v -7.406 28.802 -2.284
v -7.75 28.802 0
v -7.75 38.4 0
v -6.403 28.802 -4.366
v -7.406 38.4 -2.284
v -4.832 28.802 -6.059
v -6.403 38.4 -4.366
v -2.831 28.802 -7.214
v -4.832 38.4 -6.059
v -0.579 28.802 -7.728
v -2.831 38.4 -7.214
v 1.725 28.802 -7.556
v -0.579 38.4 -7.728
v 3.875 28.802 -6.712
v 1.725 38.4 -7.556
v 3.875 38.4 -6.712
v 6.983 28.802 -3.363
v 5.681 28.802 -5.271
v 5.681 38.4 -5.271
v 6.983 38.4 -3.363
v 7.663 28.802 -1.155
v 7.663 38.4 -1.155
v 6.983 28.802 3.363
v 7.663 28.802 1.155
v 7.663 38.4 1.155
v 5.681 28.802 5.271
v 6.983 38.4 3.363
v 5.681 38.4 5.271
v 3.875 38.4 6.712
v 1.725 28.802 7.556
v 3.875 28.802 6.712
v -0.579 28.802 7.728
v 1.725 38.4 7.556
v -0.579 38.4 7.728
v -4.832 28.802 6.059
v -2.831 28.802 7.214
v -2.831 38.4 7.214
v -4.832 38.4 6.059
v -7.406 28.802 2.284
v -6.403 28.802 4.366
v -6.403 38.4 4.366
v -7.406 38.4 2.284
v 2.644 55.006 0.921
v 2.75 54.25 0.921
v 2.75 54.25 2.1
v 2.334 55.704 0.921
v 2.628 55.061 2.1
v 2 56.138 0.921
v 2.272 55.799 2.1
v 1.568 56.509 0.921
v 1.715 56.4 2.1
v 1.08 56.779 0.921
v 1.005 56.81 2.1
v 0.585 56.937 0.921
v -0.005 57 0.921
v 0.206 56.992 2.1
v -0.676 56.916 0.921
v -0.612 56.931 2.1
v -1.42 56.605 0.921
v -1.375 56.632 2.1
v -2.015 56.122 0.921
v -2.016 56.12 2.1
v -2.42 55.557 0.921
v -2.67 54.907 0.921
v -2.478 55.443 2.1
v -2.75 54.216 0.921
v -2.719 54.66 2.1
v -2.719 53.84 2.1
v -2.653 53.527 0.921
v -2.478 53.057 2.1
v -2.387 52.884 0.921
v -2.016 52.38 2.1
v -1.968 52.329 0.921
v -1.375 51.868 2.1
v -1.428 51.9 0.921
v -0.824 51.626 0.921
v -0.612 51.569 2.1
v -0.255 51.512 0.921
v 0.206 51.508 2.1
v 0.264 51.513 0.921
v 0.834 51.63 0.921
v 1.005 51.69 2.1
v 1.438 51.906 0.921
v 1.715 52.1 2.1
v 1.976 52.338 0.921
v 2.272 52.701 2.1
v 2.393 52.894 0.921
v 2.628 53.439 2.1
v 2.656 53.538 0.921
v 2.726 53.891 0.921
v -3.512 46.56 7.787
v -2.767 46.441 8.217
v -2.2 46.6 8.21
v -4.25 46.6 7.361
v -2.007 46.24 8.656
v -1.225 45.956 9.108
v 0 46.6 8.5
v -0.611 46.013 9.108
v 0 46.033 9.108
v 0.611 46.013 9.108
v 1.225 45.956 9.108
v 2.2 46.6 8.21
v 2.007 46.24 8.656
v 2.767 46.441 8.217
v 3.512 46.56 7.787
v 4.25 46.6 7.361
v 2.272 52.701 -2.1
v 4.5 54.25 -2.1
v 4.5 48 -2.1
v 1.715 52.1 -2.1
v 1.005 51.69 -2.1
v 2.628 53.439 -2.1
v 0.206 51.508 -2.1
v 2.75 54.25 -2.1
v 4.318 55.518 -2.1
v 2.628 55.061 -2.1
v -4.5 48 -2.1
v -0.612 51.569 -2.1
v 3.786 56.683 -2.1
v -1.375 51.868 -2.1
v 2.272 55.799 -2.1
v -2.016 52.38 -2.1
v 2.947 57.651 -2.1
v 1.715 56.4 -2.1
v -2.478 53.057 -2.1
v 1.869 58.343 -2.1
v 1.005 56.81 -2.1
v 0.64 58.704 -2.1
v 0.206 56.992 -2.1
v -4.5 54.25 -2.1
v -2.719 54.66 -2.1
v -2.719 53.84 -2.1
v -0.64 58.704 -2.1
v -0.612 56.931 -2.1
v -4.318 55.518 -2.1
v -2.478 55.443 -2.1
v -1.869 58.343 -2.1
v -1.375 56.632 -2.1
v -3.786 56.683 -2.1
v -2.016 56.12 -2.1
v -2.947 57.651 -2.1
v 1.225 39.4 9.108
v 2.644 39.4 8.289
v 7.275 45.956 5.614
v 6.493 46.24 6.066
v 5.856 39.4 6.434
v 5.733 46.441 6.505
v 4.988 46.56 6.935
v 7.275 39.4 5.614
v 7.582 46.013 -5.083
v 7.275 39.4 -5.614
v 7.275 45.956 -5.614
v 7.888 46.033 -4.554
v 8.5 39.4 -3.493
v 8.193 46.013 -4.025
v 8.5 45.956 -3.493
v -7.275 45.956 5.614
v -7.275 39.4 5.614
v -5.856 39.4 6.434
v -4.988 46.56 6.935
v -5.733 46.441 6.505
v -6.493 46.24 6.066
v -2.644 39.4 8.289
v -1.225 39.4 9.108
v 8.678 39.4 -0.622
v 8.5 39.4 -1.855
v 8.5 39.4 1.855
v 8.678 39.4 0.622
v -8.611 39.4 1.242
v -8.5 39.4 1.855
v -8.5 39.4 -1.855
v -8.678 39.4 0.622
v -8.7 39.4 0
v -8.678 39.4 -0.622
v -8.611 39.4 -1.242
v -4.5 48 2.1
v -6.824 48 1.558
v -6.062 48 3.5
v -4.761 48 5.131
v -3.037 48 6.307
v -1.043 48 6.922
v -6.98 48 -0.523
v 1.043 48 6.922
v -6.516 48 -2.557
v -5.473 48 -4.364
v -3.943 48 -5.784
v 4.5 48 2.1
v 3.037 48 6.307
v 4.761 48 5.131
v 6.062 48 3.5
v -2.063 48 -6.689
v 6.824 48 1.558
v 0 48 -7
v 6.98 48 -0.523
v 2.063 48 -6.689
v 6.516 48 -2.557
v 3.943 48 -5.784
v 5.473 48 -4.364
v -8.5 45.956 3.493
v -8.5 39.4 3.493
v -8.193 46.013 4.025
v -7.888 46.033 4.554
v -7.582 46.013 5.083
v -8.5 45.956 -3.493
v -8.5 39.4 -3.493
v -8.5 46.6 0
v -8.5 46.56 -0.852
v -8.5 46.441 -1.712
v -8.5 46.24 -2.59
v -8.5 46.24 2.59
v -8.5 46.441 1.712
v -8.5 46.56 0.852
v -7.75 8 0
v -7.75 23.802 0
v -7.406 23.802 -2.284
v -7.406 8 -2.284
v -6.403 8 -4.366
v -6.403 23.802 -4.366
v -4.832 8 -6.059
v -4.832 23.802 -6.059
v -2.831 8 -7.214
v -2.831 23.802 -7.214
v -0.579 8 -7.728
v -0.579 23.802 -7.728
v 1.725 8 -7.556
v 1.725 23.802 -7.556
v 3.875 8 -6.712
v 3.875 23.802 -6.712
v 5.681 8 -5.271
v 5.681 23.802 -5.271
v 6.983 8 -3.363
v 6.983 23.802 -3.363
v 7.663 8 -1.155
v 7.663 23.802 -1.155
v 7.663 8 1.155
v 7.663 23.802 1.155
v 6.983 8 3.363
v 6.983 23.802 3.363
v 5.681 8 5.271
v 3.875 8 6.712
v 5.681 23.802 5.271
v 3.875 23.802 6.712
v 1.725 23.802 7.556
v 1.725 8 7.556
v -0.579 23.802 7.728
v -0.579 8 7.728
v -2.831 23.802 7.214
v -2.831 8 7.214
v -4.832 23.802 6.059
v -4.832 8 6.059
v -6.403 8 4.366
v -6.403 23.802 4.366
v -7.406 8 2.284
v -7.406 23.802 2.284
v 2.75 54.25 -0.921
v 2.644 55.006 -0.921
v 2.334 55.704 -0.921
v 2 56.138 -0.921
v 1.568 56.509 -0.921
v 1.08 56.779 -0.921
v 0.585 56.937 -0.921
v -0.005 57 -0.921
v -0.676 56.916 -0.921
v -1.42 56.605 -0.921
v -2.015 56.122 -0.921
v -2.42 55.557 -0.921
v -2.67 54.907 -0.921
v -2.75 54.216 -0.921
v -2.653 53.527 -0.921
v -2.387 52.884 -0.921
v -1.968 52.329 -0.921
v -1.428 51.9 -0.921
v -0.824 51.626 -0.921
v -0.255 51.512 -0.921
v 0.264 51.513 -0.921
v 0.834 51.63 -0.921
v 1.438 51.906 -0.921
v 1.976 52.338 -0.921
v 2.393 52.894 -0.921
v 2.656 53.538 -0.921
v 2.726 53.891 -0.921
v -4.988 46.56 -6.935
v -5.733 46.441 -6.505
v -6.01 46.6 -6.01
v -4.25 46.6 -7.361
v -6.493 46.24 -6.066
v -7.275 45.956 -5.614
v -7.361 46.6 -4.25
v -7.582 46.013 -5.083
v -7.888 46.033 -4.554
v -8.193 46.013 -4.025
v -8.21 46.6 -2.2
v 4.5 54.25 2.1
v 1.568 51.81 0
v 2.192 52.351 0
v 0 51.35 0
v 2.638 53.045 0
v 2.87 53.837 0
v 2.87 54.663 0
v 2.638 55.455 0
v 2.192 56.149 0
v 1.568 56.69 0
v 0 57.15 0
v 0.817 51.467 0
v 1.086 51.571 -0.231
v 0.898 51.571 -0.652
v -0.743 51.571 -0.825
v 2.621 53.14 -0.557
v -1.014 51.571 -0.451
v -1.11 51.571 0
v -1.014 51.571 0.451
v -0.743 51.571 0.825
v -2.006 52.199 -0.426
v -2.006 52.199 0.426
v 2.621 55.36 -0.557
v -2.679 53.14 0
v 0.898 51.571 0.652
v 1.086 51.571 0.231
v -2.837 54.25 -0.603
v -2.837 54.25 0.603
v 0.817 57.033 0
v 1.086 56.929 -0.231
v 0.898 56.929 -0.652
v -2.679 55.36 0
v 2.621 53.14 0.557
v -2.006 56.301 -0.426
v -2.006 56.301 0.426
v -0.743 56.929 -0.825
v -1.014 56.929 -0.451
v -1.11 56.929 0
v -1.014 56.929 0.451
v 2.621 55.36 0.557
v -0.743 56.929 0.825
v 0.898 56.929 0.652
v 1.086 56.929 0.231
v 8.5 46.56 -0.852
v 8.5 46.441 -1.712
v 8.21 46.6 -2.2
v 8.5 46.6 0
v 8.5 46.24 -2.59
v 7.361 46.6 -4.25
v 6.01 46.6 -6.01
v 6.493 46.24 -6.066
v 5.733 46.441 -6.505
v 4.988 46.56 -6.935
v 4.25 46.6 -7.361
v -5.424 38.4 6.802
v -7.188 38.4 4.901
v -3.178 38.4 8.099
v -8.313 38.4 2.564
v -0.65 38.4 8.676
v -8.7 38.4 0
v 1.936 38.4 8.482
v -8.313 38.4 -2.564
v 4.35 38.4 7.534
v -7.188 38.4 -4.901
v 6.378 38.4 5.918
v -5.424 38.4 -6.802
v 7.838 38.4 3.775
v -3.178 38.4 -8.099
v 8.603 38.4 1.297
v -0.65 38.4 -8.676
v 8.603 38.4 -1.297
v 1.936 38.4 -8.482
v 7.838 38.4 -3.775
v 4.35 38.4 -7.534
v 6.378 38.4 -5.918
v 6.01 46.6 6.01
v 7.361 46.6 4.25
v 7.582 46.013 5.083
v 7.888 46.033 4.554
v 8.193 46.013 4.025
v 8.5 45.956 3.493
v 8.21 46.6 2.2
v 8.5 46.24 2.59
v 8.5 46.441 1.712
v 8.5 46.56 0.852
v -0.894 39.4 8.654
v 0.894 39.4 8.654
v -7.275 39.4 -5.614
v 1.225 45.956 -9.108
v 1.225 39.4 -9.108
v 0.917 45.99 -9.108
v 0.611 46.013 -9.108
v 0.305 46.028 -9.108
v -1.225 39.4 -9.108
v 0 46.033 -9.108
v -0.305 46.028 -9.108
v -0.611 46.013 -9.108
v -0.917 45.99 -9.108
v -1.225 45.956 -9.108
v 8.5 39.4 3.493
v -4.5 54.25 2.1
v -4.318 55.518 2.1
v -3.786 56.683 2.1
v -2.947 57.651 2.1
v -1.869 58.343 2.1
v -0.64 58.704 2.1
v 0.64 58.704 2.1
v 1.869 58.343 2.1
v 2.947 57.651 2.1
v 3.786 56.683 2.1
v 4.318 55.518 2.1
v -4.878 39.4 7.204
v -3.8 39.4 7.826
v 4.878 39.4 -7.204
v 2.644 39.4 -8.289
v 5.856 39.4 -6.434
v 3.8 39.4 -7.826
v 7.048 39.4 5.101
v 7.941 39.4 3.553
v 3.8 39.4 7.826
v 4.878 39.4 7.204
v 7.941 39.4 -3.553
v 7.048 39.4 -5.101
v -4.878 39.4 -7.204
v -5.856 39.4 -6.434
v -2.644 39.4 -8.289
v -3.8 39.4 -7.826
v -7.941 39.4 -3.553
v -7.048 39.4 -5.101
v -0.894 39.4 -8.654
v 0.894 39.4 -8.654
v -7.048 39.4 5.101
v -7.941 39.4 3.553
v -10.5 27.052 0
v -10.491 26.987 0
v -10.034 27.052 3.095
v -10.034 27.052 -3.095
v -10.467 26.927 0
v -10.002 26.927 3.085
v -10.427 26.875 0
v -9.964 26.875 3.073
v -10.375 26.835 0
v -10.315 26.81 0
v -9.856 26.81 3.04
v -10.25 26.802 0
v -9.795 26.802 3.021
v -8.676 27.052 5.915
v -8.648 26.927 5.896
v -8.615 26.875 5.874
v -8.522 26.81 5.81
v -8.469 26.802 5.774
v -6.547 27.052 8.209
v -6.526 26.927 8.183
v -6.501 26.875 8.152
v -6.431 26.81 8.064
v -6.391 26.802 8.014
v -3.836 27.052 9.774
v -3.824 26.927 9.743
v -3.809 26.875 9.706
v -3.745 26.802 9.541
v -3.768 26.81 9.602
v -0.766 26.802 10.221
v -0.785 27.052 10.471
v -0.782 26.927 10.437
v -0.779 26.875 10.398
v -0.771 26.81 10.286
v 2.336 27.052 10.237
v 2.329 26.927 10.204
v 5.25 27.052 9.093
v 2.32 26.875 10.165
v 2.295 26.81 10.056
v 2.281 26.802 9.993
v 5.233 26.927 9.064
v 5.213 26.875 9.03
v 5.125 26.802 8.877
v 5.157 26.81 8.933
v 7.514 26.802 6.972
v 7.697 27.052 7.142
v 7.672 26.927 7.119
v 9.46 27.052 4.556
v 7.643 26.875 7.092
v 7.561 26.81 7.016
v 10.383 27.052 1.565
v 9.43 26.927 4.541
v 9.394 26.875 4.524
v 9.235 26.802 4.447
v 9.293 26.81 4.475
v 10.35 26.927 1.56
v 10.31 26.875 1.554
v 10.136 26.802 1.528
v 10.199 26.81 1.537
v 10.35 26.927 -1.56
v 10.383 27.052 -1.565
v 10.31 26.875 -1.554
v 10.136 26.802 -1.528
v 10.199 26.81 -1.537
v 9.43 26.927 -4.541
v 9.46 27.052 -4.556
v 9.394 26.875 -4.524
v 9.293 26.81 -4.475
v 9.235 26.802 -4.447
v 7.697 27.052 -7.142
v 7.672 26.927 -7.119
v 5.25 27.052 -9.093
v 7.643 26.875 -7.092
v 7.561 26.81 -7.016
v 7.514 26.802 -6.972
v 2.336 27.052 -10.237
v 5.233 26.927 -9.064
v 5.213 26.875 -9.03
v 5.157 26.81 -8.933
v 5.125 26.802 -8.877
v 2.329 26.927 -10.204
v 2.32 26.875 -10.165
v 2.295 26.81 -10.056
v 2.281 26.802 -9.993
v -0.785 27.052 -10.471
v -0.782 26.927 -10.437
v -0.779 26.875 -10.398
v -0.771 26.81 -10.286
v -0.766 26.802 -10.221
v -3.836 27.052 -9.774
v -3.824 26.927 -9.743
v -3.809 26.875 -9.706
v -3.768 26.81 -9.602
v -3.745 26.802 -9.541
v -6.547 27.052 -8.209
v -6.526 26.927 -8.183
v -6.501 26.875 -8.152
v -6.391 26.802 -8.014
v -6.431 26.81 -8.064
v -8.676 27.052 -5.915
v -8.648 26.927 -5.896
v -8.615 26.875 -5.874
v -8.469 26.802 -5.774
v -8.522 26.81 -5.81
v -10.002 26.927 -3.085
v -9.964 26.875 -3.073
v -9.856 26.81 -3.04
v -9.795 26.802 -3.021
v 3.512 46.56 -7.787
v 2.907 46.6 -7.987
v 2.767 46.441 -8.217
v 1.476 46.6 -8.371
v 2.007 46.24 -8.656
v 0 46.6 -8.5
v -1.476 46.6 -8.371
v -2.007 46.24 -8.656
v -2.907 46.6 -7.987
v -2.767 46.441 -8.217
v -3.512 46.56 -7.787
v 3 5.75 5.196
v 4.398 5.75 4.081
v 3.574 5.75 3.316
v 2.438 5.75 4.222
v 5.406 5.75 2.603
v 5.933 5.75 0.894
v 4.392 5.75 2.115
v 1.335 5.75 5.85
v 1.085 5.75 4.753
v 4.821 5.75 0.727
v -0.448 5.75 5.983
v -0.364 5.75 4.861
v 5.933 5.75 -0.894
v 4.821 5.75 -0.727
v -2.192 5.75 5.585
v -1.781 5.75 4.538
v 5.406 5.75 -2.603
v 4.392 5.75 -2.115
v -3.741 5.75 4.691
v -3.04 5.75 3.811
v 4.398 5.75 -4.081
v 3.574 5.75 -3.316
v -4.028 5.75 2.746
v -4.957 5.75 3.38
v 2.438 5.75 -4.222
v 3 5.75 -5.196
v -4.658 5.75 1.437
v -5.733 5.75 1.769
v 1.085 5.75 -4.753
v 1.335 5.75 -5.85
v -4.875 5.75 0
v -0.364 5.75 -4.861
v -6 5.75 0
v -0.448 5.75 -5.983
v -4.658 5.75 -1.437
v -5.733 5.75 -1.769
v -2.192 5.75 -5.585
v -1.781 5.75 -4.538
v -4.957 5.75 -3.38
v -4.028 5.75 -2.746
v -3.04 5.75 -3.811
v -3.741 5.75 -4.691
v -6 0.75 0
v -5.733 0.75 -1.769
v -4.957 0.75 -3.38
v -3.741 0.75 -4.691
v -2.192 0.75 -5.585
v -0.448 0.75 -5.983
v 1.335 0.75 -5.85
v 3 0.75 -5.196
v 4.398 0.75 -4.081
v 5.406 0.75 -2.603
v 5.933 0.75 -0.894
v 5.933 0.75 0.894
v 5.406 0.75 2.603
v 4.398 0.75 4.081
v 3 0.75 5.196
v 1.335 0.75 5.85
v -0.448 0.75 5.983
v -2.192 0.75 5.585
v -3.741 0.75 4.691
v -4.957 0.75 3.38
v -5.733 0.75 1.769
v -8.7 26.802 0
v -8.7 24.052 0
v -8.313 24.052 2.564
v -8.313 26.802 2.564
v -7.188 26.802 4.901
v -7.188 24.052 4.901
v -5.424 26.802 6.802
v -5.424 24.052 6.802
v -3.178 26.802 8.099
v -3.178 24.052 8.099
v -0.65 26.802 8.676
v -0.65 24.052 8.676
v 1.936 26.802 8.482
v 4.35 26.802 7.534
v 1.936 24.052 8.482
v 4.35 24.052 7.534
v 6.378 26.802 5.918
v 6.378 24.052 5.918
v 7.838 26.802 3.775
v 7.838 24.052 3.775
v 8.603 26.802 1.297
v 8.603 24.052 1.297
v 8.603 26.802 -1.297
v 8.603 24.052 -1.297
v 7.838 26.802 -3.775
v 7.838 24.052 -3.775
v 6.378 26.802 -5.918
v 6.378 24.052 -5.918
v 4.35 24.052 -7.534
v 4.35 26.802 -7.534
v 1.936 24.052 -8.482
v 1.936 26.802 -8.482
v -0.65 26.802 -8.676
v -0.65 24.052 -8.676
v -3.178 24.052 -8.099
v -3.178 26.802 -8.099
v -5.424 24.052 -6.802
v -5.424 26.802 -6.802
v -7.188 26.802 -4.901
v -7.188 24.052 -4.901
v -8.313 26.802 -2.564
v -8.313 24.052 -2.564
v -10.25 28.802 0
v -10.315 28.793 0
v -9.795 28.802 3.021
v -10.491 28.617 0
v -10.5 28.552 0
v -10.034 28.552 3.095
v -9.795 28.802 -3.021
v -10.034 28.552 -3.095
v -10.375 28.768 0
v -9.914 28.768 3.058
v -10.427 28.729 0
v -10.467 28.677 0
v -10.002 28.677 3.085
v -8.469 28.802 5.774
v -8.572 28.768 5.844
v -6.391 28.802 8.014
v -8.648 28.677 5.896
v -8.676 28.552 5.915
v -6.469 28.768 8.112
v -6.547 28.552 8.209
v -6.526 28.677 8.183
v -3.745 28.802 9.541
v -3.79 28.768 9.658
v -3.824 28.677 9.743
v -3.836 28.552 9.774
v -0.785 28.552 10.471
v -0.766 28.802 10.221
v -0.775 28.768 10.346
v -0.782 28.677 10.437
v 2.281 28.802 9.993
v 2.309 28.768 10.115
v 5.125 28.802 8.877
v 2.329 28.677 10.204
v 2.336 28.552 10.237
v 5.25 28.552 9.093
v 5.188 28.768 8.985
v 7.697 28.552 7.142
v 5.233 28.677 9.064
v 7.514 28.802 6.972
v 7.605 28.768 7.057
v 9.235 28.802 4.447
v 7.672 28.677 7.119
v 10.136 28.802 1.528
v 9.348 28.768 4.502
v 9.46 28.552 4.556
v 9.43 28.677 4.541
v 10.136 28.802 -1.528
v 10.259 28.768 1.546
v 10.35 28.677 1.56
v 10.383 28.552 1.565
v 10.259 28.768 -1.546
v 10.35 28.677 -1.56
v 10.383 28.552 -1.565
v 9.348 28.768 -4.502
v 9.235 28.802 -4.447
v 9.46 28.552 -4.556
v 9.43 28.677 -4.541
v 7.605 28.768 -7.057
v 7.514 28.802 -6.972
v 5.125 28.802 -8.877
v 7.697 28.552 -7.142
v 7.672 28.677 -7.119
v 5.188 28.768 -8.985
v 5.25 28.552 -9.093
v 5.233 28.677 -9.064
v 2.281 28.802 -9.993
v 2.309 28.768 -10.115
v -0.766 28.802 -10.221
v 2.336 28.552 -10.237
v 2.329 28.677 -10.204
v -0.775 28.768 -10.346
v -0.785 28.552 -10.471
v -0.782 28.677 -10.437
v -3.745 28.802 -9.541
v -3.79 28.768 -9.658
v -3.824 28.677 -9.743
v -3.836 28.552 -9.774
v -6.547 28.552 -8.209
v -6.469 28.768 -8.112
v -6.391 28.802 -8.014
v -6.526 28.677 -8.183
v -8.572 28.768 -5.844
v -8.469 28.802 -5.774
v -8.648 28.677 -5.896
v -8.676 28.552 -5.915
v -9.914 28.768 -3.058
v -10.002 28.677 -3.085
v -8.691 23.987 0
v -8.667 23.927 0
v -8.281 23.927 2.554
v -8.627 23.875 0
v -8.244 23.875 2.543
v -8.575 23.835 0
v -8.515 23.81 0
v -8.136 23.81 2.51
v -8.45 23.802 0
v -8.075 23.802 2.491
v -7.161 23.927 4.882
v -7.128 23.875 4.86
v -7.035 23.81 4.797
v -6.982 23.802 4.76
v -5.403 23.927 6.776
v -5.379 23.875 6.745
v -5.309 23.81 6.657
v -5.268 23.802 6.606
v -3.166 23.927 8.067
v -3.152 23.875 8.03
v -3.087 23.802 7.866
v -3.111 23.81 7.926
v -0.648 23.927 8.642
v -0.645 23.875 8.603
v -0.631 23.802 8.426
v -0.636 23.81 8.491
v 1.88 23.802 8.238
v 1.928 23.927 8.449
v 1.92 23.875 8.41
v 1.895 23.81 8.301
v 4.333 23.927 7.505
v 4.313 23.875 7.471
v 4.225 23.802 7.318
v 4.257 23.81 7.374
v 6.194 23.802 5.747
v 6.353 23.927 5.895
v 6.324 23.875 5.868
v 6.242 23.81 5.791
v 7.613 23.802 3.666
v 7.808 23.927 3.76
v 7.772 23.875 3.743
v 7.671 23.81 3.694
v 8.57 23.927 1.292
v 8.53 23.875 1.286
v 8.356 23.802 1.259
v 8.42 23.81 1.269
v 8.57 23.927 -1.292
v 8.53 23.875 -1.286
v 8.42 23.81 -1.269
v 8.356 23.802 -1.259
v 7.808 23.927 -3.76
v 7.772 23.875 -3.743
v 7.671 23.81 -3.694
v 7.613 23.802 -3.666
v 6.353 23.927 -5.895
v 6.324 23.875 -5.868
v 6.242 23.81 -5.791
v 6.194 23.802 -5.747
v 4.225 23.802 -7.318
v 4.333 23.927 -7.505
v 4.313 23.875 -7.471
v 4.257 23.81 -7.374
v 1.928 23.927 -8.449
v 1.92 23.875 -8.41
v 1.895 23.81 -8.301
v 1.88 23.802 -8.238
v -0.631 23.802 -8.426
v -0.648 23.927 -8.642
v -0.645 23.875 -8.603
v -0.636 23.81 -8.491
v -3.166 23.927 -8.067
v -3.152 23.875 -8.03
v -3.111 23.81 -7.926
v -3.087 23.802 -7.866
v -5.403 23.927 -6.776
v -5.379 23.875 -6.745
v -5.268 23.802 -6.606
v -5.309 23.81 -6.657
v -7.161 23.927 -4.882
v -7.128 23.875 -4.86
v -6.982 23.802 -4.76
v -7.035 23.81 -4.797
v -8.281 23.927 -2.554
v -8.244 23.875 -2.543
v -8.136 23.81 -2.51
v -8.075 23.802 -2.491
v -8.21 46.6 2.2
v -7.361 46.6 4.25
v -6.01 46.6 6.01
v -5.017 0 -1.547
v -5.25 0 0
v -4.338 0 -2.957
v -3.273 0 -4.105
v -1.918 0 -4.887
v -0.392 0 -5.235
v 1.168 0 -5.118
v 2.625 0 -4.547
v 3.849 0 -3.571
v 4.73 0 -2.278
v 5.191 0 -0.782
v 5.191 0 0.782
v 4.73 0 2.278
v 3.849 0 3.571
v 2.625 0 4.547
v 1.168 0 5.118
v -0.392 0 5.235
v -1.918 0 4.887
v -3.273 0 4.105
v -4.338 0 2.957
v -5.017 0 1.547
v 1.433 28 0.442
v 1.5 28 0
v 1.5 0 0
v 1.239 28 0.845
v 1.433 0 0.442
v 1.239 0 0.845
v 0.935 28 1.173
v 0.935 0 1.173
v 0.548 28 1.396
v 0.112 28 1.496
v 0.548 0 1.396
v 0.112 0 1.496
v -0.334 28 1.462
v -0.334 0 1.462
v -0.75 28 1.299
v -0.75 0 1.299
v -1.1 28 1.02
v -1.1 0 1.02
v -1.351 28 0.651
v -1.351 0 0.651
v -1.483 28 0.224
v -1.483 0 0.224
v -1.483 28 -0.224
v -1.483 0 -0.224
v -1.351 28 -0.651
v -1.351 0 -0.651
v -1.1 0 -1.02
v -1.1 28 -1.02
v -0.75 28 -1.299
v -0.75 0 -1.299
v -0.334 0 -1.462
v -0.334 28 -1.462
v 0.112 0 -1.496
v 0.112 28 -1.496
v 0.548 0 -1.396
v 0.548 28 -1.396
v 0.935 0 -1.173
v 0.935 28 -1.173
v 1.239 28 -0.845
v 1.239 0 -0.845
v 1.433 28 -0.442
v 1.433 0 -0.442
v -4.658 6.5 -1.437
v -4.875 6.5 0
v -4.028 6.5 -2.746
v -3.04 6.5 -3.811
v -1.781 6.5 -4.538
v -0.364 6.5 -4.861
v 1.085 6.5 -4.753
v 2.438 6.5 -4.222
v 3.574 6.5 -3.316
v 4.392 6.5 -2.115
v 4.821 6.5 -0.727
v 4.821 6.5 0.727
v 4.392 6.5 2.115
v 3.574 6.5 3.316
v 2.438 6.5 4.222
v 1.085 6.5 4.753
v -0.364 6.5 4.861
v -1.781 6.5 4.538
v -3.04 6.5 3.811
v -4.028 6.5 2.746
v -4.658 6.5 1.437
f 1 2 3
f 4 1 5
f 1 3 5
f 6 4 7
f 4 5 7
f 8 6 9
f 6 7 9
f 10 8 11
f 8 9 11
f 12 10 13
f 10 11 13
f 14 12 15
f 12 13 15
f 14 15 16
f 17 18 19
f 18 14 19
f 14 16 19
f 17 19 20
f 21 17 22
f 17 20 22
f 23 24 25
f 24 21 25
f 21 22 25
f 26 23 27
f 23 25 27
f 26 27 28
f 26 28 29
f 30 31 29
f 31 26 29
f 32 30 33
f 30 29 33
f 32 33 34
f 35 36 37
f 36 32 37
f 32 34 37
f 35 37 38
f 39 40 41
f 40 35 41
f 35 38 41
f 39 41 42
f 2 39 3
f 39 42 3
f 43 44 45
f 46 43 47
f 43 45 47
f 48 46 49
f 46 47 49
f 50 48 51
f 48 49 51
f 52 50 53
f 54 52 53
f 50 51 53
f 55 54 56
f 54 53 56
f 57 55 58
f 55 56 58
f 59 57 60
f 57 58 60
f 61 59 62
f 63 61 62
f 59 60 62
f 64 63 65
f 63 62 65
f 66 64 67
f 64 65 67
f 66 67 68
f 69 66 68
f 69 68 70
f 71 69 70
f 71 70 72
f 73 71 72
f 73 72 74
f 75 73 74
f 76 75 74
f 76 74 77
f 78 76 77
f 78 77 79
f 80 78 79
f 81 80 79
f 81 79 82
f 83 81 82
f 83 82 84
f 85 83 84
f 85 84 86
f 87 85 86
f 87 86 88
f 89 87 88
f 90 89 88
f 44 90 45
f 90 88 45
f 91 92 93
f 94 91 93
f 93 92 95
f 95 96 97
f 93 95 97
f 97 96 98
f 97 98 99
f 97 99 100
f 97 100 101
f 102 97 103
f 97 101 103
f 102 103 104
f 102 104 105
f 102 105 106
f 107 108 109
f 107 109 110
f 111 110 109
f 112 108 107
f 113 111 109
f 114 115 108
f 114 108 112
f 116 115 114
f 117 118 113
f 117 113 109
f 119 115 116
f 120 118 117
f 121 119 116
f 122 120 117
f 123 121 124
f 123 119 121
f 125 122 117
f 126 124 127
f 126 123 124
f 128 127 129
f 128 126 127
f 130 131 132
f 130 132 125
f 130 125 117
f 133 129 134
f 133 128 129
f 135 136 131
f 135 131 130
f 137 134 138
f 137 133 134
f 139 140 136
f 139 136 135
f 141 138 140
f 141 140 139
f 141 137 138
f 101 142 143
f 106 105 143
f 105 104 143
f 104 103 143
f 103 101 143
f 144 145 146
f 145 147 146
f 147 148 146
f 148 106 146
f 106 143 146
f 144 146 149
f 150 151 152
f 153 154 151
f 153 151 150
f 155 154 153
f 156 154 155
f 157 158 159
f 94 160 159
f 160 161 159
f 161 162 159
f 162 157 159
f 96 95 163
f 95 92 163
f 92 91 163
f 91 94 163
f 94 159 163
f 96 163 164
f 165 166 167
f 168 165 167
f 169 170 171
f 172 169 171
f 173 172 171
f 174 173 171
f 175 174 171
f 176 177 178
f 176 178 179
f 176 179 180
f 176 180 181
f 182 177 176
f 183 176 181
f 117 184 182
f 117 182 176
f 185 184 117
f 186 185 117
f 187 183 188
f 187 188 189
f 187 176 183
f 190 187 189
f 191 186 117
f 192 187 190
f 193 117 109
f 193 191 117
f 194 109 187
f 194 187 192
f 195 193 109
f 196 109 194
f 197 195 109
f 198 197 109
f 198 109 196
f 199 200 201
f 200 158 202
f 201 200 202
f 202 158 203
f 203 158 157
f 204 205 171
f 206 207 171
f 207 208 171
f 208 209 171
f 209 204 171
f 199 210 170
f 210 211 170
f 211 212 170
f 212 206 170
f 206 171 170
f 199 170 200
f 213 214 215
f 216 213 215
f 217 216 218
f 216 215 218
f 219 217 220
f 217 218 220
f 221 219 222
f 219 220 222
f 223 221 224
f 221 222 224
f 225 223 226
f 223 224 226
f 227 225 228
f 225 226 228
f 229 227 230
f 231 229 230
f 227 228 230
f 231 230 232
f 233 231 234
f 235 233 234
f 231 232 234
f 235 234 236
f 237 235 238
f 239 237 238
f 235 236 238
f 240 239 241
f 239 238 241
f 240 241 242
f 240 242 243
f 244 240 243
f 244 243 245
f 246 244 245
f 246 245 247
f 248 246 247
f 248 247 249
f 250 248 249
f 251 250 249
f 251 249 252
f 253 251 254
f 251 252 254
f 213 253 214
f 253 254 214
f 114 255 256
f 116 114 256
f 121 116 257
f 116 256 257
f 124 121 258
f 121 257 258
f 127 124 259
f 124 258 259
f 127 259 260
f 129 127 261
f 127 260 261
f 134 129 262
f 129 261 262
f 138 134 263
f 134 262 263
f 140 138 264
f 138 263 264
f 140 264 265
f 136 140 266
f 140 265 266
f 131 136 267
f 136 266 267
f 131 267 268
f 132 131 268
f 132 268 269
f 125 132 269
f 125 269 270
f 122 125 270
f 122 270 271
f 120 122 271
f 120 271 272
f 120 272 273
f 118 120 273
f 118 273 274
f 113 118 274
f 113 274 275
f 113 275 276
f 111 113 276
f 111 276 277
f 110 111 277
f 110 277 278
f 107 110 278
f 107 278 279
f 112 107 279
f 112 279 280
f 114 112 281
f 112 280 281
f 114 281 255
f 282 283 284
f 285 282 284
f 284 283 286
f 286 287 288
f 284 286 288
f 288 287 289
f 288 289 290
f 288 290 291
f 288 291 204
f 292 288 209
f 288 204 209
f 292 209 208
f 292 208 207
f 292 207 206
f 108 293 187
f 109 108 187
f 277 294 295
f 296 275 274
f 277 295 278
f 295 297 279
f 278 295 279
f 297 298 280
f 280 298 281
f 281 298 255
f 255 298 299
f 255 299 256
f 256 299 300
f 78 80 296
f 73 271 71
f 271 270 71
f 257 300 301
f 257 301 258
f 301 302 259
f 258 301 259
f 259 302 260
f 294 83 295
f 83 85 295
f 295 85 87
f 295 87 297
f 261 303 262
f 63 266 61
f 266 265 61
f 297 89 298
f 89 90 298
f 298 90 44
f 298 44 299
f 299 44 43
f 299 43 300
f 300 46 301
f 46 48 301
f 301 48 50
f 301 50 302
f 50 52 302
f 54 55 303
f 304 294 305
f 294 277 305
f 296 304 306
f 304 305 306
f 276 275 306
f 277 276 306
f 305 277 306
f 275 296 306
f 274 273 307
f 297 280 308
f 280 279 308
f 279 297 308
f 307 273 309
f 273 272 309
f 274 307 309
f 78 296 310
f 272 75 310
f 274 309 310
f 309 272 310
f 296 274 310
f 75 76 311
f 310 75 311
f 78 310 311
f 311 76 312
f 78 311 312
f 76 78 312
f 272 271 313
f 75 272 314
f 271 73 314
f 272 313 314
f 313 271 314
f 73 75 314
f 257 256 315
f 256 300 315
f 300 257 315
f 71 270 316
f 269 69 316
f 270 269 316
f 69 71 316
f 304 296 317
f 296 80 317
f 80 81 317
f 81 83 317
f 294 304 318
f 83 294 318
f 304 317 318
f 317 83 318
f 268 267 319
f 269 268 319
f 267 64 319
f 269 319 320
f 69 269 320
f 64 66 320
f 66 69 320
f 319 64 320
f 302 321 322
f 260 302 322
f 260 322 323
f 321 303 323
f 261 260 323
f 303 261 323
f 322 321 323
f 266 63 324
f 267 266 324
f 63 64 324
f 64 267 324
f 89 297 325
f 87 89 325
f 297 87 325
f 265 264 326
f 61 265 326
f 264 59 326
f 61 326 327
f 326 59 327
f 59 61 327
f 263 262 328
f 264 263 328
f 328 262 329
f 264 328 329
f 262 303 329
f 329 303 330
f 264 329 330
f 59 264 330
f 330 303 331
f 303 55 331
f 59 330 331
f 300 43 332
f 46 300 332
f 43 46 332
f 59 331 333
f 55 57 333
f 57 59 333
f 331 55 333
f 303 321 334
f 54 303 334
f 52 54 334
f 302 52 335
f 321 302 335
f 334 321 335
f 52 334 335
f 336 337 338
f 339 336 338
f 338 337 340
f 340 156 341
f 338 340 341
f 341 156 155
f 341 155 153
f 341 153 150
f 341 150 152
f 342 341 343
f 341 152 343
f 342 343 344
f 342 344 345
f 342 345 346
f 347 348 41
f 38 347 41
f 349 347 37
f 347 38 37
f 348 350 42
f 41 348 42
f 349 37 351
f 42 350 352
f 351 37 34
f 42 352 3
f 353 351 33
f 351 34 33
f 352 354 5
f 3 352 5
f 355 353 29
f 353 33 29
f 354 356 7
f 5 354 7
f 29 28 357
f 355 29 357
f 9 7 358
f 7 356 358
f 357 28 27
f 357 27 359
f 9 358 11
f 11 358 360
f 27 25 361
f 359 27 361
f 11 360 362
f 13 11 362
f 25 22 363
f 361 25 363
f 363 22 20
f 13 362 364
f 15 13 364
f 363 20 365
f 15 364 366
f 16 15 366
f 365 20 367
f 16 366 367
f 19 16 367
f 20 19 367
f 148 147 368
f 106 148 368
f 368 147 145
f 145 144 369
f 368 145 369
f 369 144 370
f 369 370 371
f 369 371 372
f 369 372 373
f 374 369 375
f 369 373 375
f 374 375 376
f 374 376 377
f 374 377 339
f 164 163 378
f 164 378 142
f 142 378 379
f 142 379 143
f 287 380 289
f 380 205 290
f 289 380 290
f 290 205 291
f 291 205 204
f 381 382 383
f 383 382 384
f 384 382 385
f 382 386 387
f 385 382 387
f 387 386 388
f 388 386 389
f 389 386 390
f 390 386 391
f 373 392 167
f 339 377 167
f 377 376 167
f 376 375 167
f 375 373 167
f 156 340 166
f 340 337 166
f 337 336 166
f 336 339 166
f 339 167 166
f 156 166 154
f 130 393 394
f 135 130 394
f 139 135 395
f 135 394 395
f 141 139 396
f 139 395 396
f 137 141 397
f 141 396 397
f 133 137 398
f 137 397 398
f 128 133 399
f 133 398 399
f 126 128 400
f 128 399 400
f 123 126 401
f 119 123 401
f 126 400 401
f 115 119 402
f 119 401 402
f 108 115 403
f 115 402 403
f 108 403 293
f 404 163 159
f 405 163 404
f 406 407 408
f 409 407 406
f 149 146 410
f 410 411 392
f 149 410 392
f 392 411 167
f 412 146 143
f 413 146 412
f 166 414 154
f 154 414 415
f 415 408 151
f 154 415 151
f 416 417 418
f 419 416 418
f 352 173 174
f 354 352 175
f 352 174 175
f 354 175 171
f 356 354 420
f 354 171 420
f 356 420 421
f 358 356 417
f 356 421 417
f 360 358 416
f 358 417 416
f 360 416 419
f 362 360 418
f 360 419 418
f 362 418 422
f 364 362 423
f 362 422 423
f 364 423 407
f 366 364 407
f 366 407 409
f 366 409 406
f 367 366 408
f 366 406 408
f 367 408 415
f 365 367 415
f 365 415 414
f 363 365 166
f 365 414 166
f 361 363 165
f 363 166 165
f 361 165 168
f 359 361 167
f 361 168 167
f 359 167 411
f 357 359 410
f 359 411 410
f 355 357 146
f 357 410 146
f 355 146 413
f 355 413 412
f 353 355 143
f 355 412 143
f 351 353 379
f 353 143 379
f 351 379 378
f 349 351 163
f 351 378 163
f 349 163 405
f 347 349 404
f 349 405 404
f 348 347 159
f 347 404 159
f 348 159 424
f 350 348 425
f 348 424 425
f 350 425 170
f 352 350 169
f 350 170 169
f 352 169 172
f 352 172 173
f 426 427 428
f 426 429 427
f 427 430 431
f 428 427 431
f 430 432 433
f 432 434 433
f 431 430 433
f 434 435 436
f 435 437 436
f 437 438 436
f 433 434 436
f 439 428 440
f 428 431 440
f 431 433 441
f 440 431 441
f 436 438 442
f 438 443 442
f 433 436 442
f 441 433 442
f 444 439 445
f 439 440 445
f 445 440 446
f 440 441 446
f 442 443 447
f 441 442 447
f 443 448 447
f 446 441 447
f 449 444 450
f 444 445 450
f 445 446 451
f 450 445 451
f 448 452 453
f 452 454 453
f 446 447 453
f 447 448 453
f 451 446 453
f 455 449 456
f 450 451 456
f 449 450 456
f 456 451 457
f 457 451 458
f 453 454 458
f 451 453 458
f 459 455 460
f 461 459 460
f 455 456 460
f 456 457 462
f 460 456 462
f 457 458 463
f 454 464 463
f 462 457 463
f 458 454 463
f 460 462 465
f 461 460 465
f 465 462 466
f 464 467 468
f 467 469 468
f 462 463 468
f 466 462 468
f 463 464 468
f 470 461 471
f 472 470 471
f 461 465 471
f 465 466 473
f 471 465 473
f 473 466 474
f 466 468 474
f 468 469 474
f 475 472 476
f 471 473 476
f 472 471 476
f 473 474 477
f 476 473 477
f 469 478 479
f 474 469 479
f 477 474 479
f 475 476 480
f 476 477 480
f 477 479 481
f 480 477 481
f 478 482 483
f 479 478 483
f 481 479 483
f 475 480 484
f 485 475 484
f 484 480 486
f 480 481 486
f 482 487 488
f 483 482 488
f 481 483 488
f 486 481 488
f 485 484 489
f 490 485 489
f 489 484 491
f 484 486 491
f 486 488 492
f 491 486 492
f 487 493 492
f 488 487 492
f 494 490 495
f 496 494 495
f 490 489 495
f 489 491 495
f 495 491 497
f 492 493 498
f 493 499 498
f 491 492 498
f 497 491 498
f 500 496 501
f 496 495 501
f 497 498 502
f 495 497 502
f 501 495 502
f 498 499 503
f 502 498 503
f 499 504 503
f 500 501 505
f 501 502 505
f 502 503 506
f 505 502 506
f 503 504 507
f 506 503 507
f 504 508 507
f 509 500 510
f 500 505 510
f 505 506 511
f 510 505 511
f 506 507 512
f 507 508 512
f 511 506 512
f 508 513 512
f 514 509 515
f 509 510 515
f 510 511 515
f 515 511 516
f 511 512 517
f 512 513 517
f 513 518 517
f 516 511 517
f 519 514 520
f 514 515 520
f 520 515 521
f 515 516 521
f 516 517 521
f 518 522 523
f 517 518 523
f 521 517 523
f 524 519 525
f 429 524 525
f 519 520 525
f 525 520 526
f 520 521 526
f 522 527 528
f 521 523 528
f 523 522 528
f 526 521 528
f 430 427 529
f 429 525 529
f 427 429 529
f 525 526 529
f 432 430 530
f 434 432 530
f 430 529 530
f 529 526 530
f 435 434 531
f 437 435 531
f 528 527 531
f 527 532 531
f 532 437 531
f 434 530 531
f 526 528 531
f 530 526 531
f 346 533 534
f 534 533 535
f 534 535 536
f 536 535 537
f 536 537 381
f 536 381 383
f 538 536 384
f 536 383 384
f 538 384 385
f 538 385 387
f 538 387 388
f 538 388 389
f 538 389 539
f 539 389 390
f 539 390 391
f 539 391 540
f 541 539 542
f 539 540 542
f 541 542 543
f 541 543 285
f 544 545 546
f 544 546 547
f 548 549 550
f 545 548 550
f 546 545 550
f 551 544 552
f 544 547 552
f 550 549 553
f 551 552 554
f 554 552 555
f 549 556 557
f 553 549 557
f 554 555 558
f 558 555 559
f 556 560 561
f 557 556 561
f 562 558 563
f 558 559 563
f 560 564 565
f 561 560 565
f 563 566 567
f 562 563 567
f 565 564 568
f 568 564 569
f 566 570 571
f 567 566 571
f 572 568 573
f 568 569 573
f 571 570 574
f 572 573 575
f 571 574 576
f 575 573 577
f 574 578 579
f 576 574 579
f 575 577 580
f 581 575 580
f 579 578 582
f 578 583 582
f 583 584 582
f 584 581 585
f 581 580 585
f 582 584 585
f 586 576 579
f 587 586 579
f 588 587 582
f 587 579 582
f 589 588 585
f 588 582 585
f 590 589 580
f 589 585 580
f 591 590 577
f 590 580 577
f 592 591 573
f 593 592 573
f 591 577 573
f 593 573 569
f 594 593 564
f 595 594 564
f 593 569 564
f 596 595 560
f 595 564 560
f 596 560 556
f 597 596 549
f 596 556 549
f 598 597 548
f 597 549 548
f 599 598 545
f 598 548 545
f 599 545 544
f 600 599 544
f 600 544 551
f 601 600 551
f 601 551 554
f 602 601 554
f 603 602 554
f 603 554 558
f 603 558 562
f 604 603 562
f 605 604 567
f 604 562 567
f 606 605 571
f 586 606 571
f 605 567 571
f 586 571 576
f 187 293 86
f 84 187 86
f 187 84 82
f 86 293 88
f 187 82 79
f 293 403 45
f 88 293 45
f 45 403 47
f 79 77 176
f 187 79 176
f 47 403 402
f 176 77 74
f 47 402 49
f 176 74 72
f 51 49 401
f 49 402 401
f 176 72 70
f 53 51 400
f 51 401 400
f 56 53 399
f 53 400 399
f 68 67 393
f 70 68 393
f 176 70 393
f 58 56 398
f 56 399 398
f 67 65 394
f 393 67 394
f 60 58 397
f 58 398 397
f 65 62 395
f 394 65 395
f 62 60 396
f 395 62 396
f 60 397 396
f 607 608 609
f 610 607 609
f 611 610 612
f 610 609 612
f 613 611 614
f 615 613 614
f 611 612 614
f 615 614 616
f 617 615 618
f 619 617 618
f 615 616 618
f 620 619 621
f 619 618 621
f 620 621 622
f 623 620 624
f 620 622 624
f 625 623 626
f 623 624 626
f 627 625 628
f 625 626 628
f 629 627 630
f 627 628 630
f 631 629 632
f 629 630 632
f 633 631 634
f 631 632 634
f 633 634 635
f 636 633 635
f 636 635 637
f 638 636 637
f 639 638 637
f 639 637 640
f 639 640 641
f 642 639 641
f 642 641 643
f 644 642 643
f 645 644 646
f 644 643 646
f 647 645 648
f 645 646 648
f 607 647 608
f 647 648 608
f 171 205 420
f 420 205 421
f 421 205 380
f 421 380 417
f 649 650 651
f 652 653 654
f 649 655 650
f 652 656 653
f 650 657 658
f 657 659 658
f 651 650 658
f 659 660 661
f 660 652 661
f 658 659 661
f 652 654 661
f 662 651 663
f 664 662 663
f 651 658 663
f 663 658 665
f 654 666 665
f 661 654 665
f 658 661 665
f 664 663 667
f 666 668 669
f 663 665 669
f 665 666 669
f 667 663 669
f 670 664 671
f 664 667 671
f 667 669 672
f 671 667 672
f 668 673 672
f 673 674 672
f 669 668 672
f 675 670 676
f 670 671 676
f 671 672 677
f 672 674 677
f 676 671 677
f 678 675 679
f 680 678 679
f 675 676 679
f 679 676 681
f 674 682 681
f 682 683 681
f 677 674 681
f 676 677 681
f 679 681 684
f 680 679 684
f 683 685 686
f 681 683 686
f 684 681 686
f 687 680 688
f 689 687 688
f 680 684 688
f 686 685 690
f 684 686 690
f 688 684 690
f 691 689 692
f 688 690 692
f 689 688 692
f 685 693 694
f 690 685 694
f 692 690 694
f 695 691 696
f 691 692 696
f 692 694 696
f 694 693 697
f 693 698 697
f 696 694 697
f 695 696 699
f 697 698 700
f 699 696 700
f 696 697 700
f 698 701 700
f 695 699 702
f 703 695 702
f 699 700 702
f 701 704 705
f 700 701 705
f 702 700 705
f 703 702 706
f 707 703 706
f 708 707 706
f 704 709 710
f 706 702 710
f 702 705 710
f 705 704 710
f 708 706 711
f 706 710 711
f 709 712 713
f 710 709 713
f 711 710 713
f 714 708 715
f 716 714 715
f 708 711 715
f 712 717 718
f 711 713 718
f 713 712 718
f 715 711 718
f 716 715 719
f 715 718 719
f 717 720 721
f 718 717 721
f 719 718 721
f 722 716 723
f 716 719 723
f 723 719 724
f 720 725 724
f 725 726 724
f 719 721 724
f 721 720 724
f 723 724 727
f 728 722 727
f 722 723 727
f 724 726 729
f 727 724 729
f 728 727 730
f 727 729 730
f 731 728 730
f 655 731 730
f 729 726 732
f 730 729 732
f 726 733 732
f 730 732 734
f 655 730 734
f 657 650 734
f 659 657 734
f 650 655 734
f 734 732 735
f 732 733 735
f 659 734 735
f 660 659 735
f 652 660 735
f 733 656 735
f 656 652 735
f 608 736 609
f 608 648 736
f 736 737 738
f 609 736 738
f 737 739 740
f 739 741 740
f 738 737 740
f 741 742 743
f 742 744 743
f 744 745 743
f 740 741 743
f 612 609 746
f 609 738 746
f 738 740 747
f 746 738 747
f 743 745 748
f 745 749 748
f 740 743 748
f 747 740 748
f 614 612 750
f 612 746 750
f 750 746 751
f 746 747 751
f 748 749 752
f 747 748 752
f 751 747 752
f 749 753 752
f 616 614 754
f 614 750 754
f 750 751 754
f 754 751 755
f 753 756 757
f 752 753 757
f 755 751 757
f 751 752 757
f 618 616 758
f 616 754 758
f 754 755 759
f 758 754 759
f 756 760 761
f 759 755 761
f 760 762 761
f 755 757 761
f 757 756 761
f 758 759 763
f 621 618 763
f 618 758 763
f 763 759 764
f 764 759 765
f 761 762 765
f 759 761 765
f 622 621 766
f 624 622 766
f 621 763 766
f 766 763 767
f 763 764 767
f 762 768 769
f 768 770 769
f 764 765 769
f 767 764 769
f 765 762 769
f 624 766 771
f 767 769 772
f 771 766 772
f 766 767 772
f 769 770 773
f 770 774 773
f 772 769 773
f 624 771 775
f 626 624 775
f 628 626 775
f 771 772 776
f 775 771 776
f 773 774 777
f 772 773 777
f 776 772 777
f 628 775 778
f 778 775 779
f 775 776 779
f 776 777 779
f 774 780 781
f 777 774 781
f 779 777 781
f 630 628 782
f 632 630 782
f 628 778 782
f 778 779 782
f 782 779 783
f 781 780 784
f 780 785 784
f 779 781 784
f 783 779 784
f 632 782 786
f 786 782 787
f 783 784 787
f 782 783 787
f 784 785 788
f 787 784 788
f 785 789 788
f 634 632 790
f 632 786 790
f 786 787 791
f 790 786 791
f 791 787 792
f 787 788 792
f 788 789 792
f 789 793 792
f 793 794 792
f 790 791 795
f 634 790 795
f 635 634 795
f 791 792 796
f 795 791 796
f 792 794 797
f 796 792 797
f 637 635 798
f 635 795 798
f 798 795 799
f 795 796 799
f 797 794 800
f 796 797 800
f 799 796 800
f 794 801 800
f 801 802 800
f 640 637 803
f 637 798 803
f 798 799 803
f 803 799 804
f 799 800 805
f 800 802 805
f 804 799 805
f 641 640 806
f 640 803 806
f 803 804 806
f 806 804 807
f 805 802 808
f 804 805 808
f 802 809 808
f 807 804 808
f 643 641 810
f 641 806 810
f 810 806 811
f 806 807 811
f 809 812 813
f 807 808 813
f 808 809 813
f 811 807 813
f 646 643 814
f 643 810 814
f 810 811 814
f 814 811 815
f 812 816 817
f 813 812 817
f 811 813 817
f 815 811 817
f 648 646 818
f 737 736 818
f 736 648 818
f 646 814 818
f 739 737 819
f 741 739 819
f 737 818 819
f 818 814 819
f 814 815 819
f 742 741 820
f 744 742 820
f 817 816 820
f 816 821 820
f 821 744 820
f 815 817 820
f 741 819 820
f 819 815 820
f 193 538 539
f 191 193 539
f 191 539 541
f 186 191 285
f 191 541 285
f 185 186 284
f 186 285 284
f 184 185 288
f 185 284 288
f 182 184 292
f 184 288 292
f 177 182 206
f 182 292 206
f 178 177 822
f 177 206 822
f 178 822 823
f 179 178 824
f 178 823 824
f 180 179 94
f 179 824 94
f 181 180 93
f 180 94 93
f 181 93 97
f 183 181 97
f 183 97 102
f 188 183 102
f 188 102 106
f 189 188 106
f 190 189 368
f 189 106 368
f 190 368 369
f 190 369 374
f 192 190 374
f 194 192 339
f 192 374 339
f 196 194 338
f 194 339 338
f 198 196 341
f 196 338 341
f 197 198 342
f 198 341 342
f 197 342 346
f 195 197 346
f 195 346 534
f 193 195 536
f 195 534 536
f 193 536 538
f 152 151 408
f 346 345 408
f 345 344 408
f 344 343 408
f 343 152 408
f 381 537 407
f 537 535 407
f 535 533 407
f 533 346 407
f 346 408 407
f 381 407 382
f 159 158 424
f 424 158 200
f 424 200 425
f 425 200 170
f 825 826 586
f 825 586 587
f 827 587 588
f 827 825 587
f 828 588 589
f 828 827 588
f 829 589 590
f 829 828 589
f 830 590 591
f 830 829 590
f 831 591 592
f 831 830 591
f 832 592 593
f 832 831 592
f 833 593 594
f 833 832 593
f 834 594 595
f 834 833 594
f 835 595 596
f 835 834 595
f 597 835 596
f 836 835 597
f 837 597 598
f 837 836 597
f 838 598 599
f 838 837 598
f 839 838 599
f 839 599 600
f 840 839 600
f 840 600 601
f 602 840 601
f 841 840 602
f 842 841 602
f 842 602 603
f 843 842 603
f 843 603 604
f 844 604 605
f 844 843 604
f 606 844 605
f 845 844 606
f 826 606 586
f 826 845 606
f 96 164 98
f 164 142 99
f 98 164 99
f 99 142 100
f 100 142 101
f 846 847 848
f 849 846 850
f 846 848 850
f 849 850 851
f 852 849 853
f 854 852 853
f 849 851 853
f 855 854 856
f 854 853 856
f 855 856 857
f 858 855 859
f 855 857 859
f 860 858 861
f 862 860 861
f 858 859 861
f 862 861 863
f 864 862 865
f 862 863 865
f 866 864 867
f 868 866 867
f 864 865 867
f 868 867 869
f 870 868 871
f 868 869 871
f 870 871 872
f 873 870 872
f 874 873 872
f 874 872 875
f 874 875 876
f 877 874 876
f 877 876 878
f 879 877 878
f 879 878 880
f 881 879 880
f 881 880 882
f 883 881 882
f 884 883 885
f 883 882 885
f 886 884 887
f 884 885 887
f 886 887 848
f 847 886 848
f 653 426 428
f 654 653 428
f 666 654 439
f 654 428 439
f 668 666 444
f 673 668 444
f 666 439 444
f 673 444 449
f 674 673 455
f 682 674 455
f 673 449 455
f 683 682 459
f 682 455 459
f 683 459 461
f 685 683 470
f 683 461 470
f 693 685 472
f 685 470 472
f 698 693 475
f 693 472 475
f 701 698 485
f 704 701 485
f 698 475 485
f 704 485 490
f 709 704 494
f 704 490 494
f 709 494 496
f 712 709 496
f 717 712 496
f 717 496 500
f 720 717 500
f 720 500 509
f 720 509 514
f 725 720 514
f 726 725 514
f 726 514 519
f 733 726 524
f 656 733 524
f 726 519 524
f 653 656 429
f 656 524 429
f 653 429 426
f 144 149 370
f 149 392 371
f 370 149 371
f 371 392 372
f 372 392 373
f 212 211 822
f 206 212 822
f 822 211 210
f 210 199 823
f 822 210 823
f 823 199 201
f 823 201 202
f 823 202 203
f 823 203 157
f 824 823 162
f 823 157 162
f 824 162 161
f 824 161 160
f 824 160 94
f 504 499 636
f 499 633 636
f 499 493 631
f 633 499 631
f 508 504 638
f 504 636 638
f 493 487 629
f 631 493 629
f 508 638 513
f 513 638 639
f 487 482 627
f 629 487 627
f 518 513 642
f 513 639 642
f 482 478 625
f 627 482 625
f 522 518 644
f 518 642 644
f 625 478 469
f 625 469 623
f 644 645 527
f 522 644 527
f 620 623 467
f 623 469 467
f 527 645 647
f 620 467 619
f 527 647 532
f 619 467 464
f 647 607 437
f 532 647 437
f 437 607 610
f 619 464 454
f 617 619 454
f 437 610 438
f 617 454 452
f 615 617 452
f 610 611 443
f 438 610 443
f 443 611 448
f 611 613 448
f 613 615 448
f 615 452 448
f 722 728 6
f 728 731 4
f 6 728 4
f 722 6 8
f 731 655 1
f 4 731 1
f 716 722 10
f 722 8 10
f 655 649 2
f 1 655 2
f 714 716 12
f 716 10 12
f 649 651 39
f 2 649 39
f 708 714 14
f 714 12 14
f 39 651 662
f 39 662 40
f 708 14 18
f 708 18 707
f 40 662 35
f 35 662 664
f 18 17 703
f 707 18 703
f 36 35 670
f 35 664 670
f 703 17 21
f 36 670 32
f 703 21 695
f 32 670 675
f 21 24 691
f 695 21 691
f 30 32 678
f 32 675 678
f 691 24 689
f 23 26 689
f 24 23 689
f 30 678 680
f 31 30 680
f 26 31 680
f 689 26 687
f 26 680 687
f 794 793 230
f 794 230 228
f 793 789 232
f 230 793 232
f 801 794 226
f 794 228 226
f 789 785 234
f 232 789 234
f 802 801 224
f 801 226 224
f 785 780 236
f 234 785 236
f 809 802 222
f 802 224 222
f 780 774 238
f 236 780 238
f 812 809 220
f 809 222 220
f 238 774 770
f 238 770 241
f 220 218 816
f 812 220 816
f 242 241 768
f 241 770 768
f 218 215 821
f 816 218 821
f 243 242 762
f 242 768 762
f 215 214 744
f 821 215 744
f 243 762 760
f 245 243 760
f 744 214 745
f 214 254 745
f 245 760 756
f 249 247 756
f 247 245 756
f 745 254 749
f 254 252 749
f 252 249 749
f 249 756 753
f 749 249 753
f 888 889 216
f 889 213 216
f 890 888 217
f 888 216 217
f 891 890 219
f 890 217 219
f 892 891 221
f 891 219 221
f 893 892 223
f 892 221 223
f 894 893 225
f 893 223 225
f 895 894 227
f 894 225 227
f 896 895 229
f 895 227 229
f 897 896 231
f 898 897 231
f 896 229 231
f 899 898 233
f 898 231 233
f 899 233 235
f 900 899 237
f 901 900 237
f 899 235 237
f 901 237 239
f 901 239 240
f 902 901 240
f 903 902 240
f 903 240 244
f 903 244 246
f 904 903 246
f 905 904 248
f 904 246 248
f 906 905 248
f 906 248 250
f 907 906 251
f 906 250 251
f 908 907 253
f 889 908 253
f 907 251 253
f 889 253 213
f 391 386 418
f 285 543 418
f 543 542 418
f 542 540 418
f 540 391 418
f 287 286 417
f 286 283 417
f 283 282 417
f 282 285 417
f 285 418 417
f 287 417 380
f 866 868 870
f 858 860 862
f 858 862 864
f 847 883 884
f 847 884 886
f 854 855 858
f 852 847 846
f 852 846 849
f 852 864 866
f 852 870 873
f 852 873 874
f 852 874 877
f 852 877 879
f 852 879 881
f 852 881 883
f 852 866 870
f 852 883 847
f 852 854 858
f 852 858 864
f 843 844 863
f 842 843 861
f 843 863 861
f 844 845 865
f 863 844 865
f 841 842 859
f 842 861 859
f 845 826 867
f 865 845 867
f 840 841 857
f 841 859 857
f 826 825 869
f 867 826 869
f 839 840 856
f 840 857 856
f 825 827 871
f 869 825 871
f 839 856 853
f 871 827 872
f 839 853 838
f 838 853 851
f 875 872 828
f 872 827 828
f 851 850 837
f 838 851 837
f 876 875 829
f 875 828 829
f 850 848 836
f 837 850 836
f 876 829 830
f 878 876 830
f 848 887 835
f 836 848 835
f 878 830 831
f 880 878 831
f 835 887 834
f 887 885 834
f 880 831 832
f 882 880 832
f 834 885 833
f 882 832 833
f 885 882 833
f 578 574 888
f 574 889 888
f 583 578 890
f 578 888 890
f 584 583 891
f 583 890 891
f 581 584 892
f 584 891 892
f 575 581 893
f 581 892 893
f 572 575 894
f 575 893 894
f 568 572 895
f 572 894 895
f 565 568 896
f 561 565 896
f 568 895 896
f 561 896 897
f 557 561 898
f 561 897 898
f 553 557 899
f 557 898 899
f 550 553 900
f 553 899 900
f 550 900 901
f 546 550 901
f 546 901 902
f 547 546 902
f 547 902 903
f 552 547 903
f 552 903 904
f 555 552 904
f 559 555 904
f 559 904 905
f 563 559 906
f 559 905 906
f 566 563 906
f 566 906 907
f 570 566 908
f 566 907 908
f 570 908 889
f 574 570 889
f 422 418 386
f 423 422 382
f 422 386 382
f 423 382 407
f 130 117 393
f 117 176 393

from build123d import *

# Parameters (mm, degrees)
BOSS_EXTRUDE1_DEPTH  = 8.6
CHAMFER1_SIZE        = 1.414
CHAMFER1_EDGE_2_SIZE = 1.414
CHAMFER1_EDGE_3_SIZE = 1.414
CHAMFER1_EDGE_4_SIZE = 1.414
CHAMFER1_EDGE_5_SIZE = 1.414
CHAMFER1_EDGE_6_SIZE = 1.414
FILLET2_R            = 0.25
SKETCH6_R            = 1.5
CUT_EXTRUDE1_DEPTH   = 28
BOSS_EXTRUDE2_DEPTH  = 2.1
SKETCH9_R            = 2.75
CUT_EXTRUDE2_DEPTH   = 4.2
CHAMFER3_SIZE        = 0.75


with BuildPart() as part:
    # Sketch1 → Revolve1 (revolve)
    with BuildSketch(Plane.XY, mode=Mode.PRIVATE) as revolve1_sk:
        Polygon((0, 0), (6, 0), (6, 5.75), (4.875, 5.75), (4.875, 6.5), (7.75, 8), (7.75, 38.4), (8.7, 38.4), (8.7, 39.4), (0, 39.4), align=None)
    revolve(revolve1_sk.sketch.rotate(Axis((0, 39.4, 0), (0, -1, 0)), 180), axis=Axis((0, 39.4, 0), (0, -1, 0)))

    # Sketch3 → Boss-Extrude1 (add)
    with BuildSketch(Plane(origin=(0, 39.4, 0), x_dir=(1, 0, 0), z_dir=(0, 1, 0))):
        Polygon((0, 9.814954576), (-8.5, 4.907477288), (-8.5, -4.907477288), (0, -9.814954576), (8.5, -4.907477288), (8.5, 4.907477288), align=None)
    extrude(amount=BOSS_EXTRUDE1_DEPTH)

    # Chamfer1
    chamfer1_edges = [part.edges().sort_by_distance(p)[0] for p in [
        (8.5, 43.7, -4.907477288),
    ]]
    chamfer(chamfer1_edges, length=CHAMFER1_SIZE)

    # Chamfer1 edge 2
    chamfer1_edge_2_edges = [part.edges().sort_by_distance(p)[0] for p in [
        (0, 43.7, -9.814954576),
    ]]
    chamfer(chamfer1_edge_2_edges, length=CHAMFER1_EDGE_2_SIZE)

    # Chamfer1 edge 3
    chamfer1_edge_3_edges = [part.edges().sort_by_distance(p)[0] for p in [
        (-8.5, 43.7, -4.907477288),
    ]]
    chamfer(chamfer1_edge_3_edges, length=CHAMFER1_EDGE_3_SIZE)

    # Chamfer1 edge 4
    chamfer1_edge_4_edges = [part.edges().sort_by_distance(p)[0] for p in [
        (-8.5, 43.7, 4.907477288),
    ]]
    chamfer(chamfer1_edge_4_edges, length=CHAMFER1_EDGE_4_SIZE)

    # Chamfer1 edge 5
    chamfer1_edge_5_edges = [part.edges().sort_by_distance(p)[0] for p in [
        (0, 43.7, 9.814954576),
    ]]
    chamfer(chamfer1_edge_5_edges, length=CHAMFER1_EDGE_5_SIZE)

    # Chamfer1 edge 6
    chamfer1_edge_6_edges = [part.edges().sort_by_distance(p)[0] for p in [
        (8.5, 43.7, 4.907477288),
    ]]
    chamfer(chamfer1_edge_6_edges, length=CHAMFER1_EDGE_6_SIZE)

    # Sketch5 → Revolve2 (revolve)
    with BuildSketch(Plane.XY, mode=Mode.PRIVATE) as revolve2_sk:
        Polygon((7.75, 28.801965379), (10.5, 28.801965379), (10.5, 26.801965379), (8.7, 26.801965379), (8.7, 23.801965379), (7.75, 23.801965379), align=None)
    revolve(revolve2_sk.sketch.rotate(Axis((0, 0, 0), (0, 1, 0)), 180), axis=Axis((0, 0, 0), (0, 1, 0)))

    # Fillet2
    fillet2_edges = [part.edges().sort_by_distance(p)[0] for p in [
        (10.5, 28.801965379, 0),
        (10.5, 26.801965379, 0),
        (8.7, 23.801965379, 0),
    ]]
    fillet(fillet2_edges, radius=FILLET2_R)

    # Sketch6 → Cut-Extrude1 (cut)
    with BuildSketch(Plane.XZ):
        Circle(SKETCH6_R)
    extrude(amount=-CUT_EXTRUDE1_DEPTH, mode=Mode.SUBTRACT)

    # Sketch7 → Boss-Extrude2 (add, symmetric)
    with BuildSketch(Plane.XY):
        with BuildLine():
            Line((4.5, 54.25), (4.5, 48))
            Line((4.5, 48), (-4.5, 48))
            Line((-4.5, 48), (-4.5, 54.25))
            ThreePointArc((-4.5, 54.25), (0, 58.75), (4.5, 54.25))
        make_face()
    extrude(amount=BOSS_EXTRUDE2_DEPTH, both=True)

    # Sketch8 → Cut-Revolve1 (revolve, cut)
    with BuildSketch(Plane.XY):
        with BuildLine():
            Line((0, 57.15), (0, 51.35))
            ThreePointArc((0, 51.35), (2.9, 54.25), (0, 57.15))
        make_face()
    revolve(axis=Axis((0, 48, 0), (0, 1, 0)), mode=Mode.SUBTRACT)

    # Sketch10 → Cut-Revolve2 (revolve, cut)
    with BuildSketch(Plane.XY, mode=Mode.PRIVATE) as cut_revolve2_sk:
        Polygon((7, 48), (8.5, 46.6), (10.124681139, 45.083630937), (10.124681139, 47.819402207), (7, 50.73577127), align=None)
    revolve(cut_revolve2_sk.sketch.rotate(Axis((0, 0, 0), (0, 1, 0)), 90), axis=Axis((0, 0, 0), (0, 1, 0)), mode=Mode.SUBTRACT)

    # Sketch9 → Cut-Extrude2 (cut)
    with BuildSketch(Plane.XY.offset(2.1)):
        with Locations((0, 54.25)):
            Circle(SKETCH9_R)
    extrude(amount=-CUT_EXTRUDE2_DEPTH, mode=Mode.SUBTRACT)

    # Chamfer3
    chamfer3_edges = [part.edges().sort_by_distance(p)[0] for p in [
        (6, 0, 0),
    ]]
    chamfer(chamfer3_edges, length=CHAMFER3_SIZE)


solid = part.part
